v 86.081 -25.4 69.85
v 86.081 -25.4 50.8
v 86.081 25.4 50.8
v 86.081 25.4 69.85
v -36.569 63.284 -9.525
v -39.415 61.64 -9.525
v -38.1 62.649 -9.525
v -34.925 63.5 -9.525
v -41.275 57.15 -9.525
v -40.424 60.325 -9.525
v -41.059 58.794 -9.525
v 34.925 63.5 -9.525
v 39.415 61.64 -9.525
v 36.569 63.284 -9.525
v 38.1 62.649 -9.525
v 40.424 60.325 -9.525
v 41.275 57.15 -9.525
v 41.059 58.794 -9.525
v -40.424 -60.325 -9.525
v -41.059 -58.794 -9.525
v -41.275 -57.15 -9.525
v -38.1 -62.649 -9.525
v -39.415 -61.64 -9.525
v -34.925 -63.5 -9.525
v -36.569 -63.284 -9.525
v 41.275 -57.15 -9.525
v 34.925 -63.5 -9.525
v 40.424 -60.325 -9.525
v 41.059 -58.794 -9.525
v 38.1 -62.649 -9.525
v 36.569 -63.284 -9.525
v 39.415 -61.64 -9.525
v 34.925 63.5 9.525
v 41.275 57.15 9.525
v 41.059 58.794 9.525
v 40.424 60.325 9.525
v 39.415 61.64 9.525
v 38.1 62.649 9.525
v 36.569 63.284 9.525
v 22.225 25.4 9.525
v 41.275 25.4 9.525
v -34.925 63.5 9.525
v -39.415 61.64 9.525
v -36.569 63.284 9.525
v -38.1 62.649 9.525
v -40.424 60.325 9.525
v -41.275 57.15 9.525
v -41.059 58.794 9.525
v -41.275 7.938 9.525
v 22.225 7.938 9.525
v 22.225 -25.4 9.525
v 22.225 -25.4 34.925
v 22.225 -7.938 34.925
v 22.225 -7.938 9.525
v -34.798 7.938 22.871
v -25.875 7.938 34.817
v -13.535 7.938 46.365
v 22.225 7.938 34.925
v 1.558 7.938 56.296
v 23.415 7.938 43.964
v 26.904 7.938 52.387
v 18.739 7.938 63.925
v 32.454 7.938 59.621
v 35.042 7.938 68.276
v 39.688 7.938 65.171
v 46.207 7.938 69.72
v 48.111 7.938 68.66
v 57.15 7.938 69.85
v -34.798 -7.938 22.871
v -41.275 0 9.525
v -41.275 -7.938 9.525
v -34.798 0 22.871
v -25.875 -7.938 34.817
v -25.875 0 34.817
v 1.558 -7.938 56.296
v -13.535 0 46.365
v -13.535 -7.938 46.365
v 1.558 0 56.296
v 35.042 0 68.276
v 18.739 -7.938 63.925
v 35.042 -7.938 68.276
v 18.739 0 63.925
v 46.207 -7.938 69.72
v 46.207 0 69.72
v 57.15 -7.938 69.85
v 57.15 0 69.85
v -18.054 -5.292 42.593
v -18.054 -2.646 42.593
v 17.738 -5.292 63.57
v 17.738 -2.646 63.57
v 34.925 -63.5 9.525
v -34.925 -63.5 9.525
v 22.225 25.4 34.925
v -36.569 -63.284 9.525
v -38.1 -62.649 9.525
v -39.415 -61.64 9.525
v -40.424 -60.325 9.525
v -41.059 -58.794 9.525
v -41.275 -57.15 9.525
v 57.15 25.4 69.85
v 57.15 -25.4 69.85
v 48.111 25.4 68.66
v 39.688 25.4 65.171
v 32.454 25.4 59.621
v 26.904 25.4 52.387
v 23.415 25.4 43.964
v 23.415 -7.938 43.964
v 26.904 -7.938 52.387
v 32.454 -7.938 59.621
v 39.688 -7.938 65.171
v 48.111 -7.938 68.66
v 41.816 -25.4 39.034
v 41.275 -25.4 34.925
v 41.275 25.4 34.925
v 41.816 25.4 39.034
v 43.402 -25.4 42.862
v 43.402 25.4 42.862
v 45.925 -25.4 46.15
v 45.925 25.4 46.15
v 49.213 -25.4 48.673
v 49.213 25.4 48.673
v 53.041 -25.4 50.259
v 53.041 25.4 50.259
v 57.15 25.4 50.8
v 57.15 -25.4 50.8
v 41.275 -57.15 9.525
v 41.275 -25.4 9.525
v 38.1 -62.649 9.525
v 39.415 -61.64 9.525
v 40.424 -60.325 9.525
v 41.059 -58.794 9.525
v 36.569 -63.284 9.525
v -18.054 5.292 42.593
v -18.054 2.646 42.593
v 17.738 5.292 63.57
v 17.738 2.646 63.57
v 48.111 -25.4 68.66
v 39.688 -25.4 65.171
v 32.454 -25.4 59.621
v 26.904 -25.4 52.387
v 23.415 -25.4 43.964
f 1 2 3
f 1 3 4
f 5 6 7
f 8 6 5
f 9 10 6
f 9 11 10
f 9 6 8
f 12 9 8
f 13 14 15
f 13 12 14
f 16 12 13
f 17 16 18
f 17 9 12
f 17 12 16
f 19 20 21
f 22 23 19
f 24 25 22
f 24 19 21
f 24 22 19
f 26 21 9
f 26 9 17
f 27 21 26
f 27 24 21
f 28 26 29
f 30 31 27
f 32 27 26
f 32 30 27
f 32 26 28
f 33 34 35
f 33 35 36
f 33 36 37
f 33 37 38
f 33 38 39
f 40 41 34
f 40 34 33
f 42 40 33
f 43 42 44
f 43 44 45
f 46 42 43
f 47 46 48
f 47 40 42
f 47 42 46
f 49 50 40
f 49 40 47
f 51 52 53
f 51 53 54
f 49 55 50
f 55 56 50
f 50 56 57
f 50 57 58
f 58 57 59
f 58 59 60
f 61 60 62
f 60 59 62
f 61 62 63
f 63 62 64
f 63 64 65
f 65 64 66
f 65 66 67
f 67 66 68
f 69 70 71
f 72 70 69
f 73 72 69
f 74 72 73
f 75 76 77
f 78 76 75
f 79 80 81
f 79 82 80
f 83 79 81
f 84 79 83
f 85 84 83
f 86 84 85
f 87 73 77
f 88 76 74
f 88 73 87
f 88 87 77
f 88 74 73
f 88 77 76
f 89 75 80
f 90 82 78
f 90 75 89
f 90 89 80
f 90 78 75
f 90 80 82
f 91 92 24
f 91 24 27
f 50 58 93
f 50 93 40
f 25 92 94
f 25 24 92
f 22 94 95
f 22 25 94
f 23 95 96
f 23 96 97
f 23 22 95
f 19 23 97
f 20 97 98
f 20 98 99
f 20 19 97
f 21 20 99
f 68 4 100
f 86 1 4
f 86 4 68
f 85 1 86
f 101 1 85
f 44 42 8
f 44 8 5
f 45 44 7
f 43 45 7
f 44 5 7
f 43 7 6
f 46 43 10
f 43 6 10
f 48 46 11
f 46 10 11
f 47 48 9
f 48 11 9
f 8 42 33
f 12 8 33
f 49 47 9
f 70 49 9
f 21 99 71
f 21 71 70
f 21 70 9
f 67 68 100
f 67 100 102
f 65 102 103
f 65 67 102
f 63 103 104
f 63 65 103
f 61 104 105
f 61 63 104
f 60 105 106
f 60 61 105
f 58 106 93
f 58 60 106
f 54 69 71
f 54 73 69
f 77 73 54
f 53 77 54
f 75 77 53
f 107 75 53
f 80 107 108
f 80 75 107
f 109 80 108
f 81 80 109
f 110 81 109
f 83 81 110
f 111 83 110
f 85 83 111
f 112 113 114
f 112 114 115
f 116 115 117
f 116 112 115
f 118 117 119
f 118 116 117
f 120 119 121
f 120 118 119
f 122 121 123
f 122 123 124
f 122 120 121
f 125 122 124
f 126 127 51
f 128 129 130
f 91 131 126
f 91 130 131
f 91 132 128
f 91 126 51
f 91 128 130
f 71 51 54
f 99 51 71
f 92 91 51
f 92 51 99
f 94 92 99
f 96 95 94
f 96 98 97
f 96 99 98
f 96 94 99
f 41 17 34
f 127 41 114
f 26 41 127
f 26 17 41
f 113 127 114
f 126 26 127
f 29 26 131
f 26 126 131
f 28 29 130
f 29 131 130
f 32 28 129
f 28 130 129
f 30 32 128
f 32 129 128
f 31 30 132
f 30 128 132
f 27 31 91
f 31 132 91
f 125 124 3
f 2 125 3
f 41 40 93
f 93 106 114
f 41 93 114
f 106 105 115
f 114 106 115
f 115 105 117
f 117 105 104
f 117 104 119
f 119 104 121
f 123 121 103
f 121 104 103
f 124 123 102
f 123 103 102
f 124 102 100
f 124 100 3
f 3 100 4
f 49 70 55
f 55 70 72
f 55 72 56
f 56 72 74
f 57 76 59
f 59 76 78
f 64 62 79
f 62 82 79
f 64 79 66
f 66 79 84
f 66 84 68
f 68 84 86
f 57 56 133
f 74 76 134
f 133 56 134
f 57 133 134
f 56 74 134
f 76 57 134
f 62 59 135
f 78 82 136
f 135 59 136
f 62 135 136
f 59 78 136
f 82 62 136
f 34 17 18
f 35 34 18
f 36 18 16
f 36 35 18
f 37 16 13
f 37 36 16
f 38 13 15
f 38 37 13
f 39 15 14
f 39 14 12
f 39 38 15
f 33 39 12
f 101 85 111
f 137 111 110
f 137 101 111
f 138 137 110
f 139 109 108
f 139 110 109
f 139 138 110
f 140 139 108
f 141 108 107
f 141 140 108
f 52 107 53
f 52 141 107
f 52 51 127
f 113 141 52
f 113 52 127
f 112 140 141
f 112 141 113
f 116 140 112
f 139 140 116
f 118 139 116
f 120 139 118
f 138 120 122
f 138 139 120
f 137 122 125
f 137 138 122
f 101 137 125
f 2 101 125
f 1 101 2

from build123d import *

# Parameters (mm, degrees)
F1_DEPTH = 63.5
F0_W     = 25.755785
F0_H     = 19.05
F2_DEPTH = 25.4
F3_DEPTH = 7.9375
F4_R     = 6.35


with BuildPart() as f1:
    # F0 (on Front) → F1 (new body, symmetric)
    with BuildSketch(Plane.XZ):
        Polygon((41.275, -9.525), (41.275, 9.525), (22.225, 9.525), (-41.275, 9.525), (-41.275, -9.525), align=None)
    extrude(amount=F1_DEPTH, both=True)

    # F0 (on Front) → F2 (join, symmetric)
    with BuildSketch(Plane.XZ):
        with BuildLine():
            Line((22.225, 9.525), (41.275, 9.525))
            Line((41.275, 9.525), (41.275, 34.925))
            ThreePointArc((41.275, 34.925), (45.92468, 46.15032), (57.15, 50.8))
            Line((57.15, 50.8), (60.325, 50.8))
            Line((60.325, 50.8), (60.325, 69.85))
            Line((60.325, 69.85), (57.15, 69.85))
            ThreePointArc((57.15, 69.85), (32.454296, 59.620704), (22.225, 34.925))
            Line((22.225, 34.925), (22.225, 9.525))
        make_face()
        with Locations((73.202892, 60.325)):
            Rectangle(F0_W, F0_H)
    extrude(amount=F2_DEPTH, both=True)

    # F0 (on Front) → F3 (join, symmetric)
    with BuildSketch(Plane.XZ):
        with BuildLine():
            Line((-41.275, 9.525), (22.225, 9.525))
            Line((22.225, 9.525), (22.225, 34.925))
            ThreePointArc((22.225, 34.925), (32.454296, 59.620704), (57.15, 69.85))
            add(Edge.make_bspline(
                [(-41.275, 9.525), (-27.324263, 47.769934), (18.911634, 71.788173), (57.15, 69.85)],
                knots=[0, 0, 0, 0, 115.440834, 115.440834, 115.440834, 115.440834], degree=3))
        make_face()
    extrude(amount=F3_DEPTH, both=True)

    # F4
    f4_edges = [f1.edges().sort_by_distance(p)[0] for p in [
        (41.275, -63.5, 0),
        (-41.275, -63.5, 0),
        (41.275, 63.5, 0),
        (-41.275, 63.5, 0),
    ]]
    fillet(f4_edges, radius=F4_R)


solid = f1.part
